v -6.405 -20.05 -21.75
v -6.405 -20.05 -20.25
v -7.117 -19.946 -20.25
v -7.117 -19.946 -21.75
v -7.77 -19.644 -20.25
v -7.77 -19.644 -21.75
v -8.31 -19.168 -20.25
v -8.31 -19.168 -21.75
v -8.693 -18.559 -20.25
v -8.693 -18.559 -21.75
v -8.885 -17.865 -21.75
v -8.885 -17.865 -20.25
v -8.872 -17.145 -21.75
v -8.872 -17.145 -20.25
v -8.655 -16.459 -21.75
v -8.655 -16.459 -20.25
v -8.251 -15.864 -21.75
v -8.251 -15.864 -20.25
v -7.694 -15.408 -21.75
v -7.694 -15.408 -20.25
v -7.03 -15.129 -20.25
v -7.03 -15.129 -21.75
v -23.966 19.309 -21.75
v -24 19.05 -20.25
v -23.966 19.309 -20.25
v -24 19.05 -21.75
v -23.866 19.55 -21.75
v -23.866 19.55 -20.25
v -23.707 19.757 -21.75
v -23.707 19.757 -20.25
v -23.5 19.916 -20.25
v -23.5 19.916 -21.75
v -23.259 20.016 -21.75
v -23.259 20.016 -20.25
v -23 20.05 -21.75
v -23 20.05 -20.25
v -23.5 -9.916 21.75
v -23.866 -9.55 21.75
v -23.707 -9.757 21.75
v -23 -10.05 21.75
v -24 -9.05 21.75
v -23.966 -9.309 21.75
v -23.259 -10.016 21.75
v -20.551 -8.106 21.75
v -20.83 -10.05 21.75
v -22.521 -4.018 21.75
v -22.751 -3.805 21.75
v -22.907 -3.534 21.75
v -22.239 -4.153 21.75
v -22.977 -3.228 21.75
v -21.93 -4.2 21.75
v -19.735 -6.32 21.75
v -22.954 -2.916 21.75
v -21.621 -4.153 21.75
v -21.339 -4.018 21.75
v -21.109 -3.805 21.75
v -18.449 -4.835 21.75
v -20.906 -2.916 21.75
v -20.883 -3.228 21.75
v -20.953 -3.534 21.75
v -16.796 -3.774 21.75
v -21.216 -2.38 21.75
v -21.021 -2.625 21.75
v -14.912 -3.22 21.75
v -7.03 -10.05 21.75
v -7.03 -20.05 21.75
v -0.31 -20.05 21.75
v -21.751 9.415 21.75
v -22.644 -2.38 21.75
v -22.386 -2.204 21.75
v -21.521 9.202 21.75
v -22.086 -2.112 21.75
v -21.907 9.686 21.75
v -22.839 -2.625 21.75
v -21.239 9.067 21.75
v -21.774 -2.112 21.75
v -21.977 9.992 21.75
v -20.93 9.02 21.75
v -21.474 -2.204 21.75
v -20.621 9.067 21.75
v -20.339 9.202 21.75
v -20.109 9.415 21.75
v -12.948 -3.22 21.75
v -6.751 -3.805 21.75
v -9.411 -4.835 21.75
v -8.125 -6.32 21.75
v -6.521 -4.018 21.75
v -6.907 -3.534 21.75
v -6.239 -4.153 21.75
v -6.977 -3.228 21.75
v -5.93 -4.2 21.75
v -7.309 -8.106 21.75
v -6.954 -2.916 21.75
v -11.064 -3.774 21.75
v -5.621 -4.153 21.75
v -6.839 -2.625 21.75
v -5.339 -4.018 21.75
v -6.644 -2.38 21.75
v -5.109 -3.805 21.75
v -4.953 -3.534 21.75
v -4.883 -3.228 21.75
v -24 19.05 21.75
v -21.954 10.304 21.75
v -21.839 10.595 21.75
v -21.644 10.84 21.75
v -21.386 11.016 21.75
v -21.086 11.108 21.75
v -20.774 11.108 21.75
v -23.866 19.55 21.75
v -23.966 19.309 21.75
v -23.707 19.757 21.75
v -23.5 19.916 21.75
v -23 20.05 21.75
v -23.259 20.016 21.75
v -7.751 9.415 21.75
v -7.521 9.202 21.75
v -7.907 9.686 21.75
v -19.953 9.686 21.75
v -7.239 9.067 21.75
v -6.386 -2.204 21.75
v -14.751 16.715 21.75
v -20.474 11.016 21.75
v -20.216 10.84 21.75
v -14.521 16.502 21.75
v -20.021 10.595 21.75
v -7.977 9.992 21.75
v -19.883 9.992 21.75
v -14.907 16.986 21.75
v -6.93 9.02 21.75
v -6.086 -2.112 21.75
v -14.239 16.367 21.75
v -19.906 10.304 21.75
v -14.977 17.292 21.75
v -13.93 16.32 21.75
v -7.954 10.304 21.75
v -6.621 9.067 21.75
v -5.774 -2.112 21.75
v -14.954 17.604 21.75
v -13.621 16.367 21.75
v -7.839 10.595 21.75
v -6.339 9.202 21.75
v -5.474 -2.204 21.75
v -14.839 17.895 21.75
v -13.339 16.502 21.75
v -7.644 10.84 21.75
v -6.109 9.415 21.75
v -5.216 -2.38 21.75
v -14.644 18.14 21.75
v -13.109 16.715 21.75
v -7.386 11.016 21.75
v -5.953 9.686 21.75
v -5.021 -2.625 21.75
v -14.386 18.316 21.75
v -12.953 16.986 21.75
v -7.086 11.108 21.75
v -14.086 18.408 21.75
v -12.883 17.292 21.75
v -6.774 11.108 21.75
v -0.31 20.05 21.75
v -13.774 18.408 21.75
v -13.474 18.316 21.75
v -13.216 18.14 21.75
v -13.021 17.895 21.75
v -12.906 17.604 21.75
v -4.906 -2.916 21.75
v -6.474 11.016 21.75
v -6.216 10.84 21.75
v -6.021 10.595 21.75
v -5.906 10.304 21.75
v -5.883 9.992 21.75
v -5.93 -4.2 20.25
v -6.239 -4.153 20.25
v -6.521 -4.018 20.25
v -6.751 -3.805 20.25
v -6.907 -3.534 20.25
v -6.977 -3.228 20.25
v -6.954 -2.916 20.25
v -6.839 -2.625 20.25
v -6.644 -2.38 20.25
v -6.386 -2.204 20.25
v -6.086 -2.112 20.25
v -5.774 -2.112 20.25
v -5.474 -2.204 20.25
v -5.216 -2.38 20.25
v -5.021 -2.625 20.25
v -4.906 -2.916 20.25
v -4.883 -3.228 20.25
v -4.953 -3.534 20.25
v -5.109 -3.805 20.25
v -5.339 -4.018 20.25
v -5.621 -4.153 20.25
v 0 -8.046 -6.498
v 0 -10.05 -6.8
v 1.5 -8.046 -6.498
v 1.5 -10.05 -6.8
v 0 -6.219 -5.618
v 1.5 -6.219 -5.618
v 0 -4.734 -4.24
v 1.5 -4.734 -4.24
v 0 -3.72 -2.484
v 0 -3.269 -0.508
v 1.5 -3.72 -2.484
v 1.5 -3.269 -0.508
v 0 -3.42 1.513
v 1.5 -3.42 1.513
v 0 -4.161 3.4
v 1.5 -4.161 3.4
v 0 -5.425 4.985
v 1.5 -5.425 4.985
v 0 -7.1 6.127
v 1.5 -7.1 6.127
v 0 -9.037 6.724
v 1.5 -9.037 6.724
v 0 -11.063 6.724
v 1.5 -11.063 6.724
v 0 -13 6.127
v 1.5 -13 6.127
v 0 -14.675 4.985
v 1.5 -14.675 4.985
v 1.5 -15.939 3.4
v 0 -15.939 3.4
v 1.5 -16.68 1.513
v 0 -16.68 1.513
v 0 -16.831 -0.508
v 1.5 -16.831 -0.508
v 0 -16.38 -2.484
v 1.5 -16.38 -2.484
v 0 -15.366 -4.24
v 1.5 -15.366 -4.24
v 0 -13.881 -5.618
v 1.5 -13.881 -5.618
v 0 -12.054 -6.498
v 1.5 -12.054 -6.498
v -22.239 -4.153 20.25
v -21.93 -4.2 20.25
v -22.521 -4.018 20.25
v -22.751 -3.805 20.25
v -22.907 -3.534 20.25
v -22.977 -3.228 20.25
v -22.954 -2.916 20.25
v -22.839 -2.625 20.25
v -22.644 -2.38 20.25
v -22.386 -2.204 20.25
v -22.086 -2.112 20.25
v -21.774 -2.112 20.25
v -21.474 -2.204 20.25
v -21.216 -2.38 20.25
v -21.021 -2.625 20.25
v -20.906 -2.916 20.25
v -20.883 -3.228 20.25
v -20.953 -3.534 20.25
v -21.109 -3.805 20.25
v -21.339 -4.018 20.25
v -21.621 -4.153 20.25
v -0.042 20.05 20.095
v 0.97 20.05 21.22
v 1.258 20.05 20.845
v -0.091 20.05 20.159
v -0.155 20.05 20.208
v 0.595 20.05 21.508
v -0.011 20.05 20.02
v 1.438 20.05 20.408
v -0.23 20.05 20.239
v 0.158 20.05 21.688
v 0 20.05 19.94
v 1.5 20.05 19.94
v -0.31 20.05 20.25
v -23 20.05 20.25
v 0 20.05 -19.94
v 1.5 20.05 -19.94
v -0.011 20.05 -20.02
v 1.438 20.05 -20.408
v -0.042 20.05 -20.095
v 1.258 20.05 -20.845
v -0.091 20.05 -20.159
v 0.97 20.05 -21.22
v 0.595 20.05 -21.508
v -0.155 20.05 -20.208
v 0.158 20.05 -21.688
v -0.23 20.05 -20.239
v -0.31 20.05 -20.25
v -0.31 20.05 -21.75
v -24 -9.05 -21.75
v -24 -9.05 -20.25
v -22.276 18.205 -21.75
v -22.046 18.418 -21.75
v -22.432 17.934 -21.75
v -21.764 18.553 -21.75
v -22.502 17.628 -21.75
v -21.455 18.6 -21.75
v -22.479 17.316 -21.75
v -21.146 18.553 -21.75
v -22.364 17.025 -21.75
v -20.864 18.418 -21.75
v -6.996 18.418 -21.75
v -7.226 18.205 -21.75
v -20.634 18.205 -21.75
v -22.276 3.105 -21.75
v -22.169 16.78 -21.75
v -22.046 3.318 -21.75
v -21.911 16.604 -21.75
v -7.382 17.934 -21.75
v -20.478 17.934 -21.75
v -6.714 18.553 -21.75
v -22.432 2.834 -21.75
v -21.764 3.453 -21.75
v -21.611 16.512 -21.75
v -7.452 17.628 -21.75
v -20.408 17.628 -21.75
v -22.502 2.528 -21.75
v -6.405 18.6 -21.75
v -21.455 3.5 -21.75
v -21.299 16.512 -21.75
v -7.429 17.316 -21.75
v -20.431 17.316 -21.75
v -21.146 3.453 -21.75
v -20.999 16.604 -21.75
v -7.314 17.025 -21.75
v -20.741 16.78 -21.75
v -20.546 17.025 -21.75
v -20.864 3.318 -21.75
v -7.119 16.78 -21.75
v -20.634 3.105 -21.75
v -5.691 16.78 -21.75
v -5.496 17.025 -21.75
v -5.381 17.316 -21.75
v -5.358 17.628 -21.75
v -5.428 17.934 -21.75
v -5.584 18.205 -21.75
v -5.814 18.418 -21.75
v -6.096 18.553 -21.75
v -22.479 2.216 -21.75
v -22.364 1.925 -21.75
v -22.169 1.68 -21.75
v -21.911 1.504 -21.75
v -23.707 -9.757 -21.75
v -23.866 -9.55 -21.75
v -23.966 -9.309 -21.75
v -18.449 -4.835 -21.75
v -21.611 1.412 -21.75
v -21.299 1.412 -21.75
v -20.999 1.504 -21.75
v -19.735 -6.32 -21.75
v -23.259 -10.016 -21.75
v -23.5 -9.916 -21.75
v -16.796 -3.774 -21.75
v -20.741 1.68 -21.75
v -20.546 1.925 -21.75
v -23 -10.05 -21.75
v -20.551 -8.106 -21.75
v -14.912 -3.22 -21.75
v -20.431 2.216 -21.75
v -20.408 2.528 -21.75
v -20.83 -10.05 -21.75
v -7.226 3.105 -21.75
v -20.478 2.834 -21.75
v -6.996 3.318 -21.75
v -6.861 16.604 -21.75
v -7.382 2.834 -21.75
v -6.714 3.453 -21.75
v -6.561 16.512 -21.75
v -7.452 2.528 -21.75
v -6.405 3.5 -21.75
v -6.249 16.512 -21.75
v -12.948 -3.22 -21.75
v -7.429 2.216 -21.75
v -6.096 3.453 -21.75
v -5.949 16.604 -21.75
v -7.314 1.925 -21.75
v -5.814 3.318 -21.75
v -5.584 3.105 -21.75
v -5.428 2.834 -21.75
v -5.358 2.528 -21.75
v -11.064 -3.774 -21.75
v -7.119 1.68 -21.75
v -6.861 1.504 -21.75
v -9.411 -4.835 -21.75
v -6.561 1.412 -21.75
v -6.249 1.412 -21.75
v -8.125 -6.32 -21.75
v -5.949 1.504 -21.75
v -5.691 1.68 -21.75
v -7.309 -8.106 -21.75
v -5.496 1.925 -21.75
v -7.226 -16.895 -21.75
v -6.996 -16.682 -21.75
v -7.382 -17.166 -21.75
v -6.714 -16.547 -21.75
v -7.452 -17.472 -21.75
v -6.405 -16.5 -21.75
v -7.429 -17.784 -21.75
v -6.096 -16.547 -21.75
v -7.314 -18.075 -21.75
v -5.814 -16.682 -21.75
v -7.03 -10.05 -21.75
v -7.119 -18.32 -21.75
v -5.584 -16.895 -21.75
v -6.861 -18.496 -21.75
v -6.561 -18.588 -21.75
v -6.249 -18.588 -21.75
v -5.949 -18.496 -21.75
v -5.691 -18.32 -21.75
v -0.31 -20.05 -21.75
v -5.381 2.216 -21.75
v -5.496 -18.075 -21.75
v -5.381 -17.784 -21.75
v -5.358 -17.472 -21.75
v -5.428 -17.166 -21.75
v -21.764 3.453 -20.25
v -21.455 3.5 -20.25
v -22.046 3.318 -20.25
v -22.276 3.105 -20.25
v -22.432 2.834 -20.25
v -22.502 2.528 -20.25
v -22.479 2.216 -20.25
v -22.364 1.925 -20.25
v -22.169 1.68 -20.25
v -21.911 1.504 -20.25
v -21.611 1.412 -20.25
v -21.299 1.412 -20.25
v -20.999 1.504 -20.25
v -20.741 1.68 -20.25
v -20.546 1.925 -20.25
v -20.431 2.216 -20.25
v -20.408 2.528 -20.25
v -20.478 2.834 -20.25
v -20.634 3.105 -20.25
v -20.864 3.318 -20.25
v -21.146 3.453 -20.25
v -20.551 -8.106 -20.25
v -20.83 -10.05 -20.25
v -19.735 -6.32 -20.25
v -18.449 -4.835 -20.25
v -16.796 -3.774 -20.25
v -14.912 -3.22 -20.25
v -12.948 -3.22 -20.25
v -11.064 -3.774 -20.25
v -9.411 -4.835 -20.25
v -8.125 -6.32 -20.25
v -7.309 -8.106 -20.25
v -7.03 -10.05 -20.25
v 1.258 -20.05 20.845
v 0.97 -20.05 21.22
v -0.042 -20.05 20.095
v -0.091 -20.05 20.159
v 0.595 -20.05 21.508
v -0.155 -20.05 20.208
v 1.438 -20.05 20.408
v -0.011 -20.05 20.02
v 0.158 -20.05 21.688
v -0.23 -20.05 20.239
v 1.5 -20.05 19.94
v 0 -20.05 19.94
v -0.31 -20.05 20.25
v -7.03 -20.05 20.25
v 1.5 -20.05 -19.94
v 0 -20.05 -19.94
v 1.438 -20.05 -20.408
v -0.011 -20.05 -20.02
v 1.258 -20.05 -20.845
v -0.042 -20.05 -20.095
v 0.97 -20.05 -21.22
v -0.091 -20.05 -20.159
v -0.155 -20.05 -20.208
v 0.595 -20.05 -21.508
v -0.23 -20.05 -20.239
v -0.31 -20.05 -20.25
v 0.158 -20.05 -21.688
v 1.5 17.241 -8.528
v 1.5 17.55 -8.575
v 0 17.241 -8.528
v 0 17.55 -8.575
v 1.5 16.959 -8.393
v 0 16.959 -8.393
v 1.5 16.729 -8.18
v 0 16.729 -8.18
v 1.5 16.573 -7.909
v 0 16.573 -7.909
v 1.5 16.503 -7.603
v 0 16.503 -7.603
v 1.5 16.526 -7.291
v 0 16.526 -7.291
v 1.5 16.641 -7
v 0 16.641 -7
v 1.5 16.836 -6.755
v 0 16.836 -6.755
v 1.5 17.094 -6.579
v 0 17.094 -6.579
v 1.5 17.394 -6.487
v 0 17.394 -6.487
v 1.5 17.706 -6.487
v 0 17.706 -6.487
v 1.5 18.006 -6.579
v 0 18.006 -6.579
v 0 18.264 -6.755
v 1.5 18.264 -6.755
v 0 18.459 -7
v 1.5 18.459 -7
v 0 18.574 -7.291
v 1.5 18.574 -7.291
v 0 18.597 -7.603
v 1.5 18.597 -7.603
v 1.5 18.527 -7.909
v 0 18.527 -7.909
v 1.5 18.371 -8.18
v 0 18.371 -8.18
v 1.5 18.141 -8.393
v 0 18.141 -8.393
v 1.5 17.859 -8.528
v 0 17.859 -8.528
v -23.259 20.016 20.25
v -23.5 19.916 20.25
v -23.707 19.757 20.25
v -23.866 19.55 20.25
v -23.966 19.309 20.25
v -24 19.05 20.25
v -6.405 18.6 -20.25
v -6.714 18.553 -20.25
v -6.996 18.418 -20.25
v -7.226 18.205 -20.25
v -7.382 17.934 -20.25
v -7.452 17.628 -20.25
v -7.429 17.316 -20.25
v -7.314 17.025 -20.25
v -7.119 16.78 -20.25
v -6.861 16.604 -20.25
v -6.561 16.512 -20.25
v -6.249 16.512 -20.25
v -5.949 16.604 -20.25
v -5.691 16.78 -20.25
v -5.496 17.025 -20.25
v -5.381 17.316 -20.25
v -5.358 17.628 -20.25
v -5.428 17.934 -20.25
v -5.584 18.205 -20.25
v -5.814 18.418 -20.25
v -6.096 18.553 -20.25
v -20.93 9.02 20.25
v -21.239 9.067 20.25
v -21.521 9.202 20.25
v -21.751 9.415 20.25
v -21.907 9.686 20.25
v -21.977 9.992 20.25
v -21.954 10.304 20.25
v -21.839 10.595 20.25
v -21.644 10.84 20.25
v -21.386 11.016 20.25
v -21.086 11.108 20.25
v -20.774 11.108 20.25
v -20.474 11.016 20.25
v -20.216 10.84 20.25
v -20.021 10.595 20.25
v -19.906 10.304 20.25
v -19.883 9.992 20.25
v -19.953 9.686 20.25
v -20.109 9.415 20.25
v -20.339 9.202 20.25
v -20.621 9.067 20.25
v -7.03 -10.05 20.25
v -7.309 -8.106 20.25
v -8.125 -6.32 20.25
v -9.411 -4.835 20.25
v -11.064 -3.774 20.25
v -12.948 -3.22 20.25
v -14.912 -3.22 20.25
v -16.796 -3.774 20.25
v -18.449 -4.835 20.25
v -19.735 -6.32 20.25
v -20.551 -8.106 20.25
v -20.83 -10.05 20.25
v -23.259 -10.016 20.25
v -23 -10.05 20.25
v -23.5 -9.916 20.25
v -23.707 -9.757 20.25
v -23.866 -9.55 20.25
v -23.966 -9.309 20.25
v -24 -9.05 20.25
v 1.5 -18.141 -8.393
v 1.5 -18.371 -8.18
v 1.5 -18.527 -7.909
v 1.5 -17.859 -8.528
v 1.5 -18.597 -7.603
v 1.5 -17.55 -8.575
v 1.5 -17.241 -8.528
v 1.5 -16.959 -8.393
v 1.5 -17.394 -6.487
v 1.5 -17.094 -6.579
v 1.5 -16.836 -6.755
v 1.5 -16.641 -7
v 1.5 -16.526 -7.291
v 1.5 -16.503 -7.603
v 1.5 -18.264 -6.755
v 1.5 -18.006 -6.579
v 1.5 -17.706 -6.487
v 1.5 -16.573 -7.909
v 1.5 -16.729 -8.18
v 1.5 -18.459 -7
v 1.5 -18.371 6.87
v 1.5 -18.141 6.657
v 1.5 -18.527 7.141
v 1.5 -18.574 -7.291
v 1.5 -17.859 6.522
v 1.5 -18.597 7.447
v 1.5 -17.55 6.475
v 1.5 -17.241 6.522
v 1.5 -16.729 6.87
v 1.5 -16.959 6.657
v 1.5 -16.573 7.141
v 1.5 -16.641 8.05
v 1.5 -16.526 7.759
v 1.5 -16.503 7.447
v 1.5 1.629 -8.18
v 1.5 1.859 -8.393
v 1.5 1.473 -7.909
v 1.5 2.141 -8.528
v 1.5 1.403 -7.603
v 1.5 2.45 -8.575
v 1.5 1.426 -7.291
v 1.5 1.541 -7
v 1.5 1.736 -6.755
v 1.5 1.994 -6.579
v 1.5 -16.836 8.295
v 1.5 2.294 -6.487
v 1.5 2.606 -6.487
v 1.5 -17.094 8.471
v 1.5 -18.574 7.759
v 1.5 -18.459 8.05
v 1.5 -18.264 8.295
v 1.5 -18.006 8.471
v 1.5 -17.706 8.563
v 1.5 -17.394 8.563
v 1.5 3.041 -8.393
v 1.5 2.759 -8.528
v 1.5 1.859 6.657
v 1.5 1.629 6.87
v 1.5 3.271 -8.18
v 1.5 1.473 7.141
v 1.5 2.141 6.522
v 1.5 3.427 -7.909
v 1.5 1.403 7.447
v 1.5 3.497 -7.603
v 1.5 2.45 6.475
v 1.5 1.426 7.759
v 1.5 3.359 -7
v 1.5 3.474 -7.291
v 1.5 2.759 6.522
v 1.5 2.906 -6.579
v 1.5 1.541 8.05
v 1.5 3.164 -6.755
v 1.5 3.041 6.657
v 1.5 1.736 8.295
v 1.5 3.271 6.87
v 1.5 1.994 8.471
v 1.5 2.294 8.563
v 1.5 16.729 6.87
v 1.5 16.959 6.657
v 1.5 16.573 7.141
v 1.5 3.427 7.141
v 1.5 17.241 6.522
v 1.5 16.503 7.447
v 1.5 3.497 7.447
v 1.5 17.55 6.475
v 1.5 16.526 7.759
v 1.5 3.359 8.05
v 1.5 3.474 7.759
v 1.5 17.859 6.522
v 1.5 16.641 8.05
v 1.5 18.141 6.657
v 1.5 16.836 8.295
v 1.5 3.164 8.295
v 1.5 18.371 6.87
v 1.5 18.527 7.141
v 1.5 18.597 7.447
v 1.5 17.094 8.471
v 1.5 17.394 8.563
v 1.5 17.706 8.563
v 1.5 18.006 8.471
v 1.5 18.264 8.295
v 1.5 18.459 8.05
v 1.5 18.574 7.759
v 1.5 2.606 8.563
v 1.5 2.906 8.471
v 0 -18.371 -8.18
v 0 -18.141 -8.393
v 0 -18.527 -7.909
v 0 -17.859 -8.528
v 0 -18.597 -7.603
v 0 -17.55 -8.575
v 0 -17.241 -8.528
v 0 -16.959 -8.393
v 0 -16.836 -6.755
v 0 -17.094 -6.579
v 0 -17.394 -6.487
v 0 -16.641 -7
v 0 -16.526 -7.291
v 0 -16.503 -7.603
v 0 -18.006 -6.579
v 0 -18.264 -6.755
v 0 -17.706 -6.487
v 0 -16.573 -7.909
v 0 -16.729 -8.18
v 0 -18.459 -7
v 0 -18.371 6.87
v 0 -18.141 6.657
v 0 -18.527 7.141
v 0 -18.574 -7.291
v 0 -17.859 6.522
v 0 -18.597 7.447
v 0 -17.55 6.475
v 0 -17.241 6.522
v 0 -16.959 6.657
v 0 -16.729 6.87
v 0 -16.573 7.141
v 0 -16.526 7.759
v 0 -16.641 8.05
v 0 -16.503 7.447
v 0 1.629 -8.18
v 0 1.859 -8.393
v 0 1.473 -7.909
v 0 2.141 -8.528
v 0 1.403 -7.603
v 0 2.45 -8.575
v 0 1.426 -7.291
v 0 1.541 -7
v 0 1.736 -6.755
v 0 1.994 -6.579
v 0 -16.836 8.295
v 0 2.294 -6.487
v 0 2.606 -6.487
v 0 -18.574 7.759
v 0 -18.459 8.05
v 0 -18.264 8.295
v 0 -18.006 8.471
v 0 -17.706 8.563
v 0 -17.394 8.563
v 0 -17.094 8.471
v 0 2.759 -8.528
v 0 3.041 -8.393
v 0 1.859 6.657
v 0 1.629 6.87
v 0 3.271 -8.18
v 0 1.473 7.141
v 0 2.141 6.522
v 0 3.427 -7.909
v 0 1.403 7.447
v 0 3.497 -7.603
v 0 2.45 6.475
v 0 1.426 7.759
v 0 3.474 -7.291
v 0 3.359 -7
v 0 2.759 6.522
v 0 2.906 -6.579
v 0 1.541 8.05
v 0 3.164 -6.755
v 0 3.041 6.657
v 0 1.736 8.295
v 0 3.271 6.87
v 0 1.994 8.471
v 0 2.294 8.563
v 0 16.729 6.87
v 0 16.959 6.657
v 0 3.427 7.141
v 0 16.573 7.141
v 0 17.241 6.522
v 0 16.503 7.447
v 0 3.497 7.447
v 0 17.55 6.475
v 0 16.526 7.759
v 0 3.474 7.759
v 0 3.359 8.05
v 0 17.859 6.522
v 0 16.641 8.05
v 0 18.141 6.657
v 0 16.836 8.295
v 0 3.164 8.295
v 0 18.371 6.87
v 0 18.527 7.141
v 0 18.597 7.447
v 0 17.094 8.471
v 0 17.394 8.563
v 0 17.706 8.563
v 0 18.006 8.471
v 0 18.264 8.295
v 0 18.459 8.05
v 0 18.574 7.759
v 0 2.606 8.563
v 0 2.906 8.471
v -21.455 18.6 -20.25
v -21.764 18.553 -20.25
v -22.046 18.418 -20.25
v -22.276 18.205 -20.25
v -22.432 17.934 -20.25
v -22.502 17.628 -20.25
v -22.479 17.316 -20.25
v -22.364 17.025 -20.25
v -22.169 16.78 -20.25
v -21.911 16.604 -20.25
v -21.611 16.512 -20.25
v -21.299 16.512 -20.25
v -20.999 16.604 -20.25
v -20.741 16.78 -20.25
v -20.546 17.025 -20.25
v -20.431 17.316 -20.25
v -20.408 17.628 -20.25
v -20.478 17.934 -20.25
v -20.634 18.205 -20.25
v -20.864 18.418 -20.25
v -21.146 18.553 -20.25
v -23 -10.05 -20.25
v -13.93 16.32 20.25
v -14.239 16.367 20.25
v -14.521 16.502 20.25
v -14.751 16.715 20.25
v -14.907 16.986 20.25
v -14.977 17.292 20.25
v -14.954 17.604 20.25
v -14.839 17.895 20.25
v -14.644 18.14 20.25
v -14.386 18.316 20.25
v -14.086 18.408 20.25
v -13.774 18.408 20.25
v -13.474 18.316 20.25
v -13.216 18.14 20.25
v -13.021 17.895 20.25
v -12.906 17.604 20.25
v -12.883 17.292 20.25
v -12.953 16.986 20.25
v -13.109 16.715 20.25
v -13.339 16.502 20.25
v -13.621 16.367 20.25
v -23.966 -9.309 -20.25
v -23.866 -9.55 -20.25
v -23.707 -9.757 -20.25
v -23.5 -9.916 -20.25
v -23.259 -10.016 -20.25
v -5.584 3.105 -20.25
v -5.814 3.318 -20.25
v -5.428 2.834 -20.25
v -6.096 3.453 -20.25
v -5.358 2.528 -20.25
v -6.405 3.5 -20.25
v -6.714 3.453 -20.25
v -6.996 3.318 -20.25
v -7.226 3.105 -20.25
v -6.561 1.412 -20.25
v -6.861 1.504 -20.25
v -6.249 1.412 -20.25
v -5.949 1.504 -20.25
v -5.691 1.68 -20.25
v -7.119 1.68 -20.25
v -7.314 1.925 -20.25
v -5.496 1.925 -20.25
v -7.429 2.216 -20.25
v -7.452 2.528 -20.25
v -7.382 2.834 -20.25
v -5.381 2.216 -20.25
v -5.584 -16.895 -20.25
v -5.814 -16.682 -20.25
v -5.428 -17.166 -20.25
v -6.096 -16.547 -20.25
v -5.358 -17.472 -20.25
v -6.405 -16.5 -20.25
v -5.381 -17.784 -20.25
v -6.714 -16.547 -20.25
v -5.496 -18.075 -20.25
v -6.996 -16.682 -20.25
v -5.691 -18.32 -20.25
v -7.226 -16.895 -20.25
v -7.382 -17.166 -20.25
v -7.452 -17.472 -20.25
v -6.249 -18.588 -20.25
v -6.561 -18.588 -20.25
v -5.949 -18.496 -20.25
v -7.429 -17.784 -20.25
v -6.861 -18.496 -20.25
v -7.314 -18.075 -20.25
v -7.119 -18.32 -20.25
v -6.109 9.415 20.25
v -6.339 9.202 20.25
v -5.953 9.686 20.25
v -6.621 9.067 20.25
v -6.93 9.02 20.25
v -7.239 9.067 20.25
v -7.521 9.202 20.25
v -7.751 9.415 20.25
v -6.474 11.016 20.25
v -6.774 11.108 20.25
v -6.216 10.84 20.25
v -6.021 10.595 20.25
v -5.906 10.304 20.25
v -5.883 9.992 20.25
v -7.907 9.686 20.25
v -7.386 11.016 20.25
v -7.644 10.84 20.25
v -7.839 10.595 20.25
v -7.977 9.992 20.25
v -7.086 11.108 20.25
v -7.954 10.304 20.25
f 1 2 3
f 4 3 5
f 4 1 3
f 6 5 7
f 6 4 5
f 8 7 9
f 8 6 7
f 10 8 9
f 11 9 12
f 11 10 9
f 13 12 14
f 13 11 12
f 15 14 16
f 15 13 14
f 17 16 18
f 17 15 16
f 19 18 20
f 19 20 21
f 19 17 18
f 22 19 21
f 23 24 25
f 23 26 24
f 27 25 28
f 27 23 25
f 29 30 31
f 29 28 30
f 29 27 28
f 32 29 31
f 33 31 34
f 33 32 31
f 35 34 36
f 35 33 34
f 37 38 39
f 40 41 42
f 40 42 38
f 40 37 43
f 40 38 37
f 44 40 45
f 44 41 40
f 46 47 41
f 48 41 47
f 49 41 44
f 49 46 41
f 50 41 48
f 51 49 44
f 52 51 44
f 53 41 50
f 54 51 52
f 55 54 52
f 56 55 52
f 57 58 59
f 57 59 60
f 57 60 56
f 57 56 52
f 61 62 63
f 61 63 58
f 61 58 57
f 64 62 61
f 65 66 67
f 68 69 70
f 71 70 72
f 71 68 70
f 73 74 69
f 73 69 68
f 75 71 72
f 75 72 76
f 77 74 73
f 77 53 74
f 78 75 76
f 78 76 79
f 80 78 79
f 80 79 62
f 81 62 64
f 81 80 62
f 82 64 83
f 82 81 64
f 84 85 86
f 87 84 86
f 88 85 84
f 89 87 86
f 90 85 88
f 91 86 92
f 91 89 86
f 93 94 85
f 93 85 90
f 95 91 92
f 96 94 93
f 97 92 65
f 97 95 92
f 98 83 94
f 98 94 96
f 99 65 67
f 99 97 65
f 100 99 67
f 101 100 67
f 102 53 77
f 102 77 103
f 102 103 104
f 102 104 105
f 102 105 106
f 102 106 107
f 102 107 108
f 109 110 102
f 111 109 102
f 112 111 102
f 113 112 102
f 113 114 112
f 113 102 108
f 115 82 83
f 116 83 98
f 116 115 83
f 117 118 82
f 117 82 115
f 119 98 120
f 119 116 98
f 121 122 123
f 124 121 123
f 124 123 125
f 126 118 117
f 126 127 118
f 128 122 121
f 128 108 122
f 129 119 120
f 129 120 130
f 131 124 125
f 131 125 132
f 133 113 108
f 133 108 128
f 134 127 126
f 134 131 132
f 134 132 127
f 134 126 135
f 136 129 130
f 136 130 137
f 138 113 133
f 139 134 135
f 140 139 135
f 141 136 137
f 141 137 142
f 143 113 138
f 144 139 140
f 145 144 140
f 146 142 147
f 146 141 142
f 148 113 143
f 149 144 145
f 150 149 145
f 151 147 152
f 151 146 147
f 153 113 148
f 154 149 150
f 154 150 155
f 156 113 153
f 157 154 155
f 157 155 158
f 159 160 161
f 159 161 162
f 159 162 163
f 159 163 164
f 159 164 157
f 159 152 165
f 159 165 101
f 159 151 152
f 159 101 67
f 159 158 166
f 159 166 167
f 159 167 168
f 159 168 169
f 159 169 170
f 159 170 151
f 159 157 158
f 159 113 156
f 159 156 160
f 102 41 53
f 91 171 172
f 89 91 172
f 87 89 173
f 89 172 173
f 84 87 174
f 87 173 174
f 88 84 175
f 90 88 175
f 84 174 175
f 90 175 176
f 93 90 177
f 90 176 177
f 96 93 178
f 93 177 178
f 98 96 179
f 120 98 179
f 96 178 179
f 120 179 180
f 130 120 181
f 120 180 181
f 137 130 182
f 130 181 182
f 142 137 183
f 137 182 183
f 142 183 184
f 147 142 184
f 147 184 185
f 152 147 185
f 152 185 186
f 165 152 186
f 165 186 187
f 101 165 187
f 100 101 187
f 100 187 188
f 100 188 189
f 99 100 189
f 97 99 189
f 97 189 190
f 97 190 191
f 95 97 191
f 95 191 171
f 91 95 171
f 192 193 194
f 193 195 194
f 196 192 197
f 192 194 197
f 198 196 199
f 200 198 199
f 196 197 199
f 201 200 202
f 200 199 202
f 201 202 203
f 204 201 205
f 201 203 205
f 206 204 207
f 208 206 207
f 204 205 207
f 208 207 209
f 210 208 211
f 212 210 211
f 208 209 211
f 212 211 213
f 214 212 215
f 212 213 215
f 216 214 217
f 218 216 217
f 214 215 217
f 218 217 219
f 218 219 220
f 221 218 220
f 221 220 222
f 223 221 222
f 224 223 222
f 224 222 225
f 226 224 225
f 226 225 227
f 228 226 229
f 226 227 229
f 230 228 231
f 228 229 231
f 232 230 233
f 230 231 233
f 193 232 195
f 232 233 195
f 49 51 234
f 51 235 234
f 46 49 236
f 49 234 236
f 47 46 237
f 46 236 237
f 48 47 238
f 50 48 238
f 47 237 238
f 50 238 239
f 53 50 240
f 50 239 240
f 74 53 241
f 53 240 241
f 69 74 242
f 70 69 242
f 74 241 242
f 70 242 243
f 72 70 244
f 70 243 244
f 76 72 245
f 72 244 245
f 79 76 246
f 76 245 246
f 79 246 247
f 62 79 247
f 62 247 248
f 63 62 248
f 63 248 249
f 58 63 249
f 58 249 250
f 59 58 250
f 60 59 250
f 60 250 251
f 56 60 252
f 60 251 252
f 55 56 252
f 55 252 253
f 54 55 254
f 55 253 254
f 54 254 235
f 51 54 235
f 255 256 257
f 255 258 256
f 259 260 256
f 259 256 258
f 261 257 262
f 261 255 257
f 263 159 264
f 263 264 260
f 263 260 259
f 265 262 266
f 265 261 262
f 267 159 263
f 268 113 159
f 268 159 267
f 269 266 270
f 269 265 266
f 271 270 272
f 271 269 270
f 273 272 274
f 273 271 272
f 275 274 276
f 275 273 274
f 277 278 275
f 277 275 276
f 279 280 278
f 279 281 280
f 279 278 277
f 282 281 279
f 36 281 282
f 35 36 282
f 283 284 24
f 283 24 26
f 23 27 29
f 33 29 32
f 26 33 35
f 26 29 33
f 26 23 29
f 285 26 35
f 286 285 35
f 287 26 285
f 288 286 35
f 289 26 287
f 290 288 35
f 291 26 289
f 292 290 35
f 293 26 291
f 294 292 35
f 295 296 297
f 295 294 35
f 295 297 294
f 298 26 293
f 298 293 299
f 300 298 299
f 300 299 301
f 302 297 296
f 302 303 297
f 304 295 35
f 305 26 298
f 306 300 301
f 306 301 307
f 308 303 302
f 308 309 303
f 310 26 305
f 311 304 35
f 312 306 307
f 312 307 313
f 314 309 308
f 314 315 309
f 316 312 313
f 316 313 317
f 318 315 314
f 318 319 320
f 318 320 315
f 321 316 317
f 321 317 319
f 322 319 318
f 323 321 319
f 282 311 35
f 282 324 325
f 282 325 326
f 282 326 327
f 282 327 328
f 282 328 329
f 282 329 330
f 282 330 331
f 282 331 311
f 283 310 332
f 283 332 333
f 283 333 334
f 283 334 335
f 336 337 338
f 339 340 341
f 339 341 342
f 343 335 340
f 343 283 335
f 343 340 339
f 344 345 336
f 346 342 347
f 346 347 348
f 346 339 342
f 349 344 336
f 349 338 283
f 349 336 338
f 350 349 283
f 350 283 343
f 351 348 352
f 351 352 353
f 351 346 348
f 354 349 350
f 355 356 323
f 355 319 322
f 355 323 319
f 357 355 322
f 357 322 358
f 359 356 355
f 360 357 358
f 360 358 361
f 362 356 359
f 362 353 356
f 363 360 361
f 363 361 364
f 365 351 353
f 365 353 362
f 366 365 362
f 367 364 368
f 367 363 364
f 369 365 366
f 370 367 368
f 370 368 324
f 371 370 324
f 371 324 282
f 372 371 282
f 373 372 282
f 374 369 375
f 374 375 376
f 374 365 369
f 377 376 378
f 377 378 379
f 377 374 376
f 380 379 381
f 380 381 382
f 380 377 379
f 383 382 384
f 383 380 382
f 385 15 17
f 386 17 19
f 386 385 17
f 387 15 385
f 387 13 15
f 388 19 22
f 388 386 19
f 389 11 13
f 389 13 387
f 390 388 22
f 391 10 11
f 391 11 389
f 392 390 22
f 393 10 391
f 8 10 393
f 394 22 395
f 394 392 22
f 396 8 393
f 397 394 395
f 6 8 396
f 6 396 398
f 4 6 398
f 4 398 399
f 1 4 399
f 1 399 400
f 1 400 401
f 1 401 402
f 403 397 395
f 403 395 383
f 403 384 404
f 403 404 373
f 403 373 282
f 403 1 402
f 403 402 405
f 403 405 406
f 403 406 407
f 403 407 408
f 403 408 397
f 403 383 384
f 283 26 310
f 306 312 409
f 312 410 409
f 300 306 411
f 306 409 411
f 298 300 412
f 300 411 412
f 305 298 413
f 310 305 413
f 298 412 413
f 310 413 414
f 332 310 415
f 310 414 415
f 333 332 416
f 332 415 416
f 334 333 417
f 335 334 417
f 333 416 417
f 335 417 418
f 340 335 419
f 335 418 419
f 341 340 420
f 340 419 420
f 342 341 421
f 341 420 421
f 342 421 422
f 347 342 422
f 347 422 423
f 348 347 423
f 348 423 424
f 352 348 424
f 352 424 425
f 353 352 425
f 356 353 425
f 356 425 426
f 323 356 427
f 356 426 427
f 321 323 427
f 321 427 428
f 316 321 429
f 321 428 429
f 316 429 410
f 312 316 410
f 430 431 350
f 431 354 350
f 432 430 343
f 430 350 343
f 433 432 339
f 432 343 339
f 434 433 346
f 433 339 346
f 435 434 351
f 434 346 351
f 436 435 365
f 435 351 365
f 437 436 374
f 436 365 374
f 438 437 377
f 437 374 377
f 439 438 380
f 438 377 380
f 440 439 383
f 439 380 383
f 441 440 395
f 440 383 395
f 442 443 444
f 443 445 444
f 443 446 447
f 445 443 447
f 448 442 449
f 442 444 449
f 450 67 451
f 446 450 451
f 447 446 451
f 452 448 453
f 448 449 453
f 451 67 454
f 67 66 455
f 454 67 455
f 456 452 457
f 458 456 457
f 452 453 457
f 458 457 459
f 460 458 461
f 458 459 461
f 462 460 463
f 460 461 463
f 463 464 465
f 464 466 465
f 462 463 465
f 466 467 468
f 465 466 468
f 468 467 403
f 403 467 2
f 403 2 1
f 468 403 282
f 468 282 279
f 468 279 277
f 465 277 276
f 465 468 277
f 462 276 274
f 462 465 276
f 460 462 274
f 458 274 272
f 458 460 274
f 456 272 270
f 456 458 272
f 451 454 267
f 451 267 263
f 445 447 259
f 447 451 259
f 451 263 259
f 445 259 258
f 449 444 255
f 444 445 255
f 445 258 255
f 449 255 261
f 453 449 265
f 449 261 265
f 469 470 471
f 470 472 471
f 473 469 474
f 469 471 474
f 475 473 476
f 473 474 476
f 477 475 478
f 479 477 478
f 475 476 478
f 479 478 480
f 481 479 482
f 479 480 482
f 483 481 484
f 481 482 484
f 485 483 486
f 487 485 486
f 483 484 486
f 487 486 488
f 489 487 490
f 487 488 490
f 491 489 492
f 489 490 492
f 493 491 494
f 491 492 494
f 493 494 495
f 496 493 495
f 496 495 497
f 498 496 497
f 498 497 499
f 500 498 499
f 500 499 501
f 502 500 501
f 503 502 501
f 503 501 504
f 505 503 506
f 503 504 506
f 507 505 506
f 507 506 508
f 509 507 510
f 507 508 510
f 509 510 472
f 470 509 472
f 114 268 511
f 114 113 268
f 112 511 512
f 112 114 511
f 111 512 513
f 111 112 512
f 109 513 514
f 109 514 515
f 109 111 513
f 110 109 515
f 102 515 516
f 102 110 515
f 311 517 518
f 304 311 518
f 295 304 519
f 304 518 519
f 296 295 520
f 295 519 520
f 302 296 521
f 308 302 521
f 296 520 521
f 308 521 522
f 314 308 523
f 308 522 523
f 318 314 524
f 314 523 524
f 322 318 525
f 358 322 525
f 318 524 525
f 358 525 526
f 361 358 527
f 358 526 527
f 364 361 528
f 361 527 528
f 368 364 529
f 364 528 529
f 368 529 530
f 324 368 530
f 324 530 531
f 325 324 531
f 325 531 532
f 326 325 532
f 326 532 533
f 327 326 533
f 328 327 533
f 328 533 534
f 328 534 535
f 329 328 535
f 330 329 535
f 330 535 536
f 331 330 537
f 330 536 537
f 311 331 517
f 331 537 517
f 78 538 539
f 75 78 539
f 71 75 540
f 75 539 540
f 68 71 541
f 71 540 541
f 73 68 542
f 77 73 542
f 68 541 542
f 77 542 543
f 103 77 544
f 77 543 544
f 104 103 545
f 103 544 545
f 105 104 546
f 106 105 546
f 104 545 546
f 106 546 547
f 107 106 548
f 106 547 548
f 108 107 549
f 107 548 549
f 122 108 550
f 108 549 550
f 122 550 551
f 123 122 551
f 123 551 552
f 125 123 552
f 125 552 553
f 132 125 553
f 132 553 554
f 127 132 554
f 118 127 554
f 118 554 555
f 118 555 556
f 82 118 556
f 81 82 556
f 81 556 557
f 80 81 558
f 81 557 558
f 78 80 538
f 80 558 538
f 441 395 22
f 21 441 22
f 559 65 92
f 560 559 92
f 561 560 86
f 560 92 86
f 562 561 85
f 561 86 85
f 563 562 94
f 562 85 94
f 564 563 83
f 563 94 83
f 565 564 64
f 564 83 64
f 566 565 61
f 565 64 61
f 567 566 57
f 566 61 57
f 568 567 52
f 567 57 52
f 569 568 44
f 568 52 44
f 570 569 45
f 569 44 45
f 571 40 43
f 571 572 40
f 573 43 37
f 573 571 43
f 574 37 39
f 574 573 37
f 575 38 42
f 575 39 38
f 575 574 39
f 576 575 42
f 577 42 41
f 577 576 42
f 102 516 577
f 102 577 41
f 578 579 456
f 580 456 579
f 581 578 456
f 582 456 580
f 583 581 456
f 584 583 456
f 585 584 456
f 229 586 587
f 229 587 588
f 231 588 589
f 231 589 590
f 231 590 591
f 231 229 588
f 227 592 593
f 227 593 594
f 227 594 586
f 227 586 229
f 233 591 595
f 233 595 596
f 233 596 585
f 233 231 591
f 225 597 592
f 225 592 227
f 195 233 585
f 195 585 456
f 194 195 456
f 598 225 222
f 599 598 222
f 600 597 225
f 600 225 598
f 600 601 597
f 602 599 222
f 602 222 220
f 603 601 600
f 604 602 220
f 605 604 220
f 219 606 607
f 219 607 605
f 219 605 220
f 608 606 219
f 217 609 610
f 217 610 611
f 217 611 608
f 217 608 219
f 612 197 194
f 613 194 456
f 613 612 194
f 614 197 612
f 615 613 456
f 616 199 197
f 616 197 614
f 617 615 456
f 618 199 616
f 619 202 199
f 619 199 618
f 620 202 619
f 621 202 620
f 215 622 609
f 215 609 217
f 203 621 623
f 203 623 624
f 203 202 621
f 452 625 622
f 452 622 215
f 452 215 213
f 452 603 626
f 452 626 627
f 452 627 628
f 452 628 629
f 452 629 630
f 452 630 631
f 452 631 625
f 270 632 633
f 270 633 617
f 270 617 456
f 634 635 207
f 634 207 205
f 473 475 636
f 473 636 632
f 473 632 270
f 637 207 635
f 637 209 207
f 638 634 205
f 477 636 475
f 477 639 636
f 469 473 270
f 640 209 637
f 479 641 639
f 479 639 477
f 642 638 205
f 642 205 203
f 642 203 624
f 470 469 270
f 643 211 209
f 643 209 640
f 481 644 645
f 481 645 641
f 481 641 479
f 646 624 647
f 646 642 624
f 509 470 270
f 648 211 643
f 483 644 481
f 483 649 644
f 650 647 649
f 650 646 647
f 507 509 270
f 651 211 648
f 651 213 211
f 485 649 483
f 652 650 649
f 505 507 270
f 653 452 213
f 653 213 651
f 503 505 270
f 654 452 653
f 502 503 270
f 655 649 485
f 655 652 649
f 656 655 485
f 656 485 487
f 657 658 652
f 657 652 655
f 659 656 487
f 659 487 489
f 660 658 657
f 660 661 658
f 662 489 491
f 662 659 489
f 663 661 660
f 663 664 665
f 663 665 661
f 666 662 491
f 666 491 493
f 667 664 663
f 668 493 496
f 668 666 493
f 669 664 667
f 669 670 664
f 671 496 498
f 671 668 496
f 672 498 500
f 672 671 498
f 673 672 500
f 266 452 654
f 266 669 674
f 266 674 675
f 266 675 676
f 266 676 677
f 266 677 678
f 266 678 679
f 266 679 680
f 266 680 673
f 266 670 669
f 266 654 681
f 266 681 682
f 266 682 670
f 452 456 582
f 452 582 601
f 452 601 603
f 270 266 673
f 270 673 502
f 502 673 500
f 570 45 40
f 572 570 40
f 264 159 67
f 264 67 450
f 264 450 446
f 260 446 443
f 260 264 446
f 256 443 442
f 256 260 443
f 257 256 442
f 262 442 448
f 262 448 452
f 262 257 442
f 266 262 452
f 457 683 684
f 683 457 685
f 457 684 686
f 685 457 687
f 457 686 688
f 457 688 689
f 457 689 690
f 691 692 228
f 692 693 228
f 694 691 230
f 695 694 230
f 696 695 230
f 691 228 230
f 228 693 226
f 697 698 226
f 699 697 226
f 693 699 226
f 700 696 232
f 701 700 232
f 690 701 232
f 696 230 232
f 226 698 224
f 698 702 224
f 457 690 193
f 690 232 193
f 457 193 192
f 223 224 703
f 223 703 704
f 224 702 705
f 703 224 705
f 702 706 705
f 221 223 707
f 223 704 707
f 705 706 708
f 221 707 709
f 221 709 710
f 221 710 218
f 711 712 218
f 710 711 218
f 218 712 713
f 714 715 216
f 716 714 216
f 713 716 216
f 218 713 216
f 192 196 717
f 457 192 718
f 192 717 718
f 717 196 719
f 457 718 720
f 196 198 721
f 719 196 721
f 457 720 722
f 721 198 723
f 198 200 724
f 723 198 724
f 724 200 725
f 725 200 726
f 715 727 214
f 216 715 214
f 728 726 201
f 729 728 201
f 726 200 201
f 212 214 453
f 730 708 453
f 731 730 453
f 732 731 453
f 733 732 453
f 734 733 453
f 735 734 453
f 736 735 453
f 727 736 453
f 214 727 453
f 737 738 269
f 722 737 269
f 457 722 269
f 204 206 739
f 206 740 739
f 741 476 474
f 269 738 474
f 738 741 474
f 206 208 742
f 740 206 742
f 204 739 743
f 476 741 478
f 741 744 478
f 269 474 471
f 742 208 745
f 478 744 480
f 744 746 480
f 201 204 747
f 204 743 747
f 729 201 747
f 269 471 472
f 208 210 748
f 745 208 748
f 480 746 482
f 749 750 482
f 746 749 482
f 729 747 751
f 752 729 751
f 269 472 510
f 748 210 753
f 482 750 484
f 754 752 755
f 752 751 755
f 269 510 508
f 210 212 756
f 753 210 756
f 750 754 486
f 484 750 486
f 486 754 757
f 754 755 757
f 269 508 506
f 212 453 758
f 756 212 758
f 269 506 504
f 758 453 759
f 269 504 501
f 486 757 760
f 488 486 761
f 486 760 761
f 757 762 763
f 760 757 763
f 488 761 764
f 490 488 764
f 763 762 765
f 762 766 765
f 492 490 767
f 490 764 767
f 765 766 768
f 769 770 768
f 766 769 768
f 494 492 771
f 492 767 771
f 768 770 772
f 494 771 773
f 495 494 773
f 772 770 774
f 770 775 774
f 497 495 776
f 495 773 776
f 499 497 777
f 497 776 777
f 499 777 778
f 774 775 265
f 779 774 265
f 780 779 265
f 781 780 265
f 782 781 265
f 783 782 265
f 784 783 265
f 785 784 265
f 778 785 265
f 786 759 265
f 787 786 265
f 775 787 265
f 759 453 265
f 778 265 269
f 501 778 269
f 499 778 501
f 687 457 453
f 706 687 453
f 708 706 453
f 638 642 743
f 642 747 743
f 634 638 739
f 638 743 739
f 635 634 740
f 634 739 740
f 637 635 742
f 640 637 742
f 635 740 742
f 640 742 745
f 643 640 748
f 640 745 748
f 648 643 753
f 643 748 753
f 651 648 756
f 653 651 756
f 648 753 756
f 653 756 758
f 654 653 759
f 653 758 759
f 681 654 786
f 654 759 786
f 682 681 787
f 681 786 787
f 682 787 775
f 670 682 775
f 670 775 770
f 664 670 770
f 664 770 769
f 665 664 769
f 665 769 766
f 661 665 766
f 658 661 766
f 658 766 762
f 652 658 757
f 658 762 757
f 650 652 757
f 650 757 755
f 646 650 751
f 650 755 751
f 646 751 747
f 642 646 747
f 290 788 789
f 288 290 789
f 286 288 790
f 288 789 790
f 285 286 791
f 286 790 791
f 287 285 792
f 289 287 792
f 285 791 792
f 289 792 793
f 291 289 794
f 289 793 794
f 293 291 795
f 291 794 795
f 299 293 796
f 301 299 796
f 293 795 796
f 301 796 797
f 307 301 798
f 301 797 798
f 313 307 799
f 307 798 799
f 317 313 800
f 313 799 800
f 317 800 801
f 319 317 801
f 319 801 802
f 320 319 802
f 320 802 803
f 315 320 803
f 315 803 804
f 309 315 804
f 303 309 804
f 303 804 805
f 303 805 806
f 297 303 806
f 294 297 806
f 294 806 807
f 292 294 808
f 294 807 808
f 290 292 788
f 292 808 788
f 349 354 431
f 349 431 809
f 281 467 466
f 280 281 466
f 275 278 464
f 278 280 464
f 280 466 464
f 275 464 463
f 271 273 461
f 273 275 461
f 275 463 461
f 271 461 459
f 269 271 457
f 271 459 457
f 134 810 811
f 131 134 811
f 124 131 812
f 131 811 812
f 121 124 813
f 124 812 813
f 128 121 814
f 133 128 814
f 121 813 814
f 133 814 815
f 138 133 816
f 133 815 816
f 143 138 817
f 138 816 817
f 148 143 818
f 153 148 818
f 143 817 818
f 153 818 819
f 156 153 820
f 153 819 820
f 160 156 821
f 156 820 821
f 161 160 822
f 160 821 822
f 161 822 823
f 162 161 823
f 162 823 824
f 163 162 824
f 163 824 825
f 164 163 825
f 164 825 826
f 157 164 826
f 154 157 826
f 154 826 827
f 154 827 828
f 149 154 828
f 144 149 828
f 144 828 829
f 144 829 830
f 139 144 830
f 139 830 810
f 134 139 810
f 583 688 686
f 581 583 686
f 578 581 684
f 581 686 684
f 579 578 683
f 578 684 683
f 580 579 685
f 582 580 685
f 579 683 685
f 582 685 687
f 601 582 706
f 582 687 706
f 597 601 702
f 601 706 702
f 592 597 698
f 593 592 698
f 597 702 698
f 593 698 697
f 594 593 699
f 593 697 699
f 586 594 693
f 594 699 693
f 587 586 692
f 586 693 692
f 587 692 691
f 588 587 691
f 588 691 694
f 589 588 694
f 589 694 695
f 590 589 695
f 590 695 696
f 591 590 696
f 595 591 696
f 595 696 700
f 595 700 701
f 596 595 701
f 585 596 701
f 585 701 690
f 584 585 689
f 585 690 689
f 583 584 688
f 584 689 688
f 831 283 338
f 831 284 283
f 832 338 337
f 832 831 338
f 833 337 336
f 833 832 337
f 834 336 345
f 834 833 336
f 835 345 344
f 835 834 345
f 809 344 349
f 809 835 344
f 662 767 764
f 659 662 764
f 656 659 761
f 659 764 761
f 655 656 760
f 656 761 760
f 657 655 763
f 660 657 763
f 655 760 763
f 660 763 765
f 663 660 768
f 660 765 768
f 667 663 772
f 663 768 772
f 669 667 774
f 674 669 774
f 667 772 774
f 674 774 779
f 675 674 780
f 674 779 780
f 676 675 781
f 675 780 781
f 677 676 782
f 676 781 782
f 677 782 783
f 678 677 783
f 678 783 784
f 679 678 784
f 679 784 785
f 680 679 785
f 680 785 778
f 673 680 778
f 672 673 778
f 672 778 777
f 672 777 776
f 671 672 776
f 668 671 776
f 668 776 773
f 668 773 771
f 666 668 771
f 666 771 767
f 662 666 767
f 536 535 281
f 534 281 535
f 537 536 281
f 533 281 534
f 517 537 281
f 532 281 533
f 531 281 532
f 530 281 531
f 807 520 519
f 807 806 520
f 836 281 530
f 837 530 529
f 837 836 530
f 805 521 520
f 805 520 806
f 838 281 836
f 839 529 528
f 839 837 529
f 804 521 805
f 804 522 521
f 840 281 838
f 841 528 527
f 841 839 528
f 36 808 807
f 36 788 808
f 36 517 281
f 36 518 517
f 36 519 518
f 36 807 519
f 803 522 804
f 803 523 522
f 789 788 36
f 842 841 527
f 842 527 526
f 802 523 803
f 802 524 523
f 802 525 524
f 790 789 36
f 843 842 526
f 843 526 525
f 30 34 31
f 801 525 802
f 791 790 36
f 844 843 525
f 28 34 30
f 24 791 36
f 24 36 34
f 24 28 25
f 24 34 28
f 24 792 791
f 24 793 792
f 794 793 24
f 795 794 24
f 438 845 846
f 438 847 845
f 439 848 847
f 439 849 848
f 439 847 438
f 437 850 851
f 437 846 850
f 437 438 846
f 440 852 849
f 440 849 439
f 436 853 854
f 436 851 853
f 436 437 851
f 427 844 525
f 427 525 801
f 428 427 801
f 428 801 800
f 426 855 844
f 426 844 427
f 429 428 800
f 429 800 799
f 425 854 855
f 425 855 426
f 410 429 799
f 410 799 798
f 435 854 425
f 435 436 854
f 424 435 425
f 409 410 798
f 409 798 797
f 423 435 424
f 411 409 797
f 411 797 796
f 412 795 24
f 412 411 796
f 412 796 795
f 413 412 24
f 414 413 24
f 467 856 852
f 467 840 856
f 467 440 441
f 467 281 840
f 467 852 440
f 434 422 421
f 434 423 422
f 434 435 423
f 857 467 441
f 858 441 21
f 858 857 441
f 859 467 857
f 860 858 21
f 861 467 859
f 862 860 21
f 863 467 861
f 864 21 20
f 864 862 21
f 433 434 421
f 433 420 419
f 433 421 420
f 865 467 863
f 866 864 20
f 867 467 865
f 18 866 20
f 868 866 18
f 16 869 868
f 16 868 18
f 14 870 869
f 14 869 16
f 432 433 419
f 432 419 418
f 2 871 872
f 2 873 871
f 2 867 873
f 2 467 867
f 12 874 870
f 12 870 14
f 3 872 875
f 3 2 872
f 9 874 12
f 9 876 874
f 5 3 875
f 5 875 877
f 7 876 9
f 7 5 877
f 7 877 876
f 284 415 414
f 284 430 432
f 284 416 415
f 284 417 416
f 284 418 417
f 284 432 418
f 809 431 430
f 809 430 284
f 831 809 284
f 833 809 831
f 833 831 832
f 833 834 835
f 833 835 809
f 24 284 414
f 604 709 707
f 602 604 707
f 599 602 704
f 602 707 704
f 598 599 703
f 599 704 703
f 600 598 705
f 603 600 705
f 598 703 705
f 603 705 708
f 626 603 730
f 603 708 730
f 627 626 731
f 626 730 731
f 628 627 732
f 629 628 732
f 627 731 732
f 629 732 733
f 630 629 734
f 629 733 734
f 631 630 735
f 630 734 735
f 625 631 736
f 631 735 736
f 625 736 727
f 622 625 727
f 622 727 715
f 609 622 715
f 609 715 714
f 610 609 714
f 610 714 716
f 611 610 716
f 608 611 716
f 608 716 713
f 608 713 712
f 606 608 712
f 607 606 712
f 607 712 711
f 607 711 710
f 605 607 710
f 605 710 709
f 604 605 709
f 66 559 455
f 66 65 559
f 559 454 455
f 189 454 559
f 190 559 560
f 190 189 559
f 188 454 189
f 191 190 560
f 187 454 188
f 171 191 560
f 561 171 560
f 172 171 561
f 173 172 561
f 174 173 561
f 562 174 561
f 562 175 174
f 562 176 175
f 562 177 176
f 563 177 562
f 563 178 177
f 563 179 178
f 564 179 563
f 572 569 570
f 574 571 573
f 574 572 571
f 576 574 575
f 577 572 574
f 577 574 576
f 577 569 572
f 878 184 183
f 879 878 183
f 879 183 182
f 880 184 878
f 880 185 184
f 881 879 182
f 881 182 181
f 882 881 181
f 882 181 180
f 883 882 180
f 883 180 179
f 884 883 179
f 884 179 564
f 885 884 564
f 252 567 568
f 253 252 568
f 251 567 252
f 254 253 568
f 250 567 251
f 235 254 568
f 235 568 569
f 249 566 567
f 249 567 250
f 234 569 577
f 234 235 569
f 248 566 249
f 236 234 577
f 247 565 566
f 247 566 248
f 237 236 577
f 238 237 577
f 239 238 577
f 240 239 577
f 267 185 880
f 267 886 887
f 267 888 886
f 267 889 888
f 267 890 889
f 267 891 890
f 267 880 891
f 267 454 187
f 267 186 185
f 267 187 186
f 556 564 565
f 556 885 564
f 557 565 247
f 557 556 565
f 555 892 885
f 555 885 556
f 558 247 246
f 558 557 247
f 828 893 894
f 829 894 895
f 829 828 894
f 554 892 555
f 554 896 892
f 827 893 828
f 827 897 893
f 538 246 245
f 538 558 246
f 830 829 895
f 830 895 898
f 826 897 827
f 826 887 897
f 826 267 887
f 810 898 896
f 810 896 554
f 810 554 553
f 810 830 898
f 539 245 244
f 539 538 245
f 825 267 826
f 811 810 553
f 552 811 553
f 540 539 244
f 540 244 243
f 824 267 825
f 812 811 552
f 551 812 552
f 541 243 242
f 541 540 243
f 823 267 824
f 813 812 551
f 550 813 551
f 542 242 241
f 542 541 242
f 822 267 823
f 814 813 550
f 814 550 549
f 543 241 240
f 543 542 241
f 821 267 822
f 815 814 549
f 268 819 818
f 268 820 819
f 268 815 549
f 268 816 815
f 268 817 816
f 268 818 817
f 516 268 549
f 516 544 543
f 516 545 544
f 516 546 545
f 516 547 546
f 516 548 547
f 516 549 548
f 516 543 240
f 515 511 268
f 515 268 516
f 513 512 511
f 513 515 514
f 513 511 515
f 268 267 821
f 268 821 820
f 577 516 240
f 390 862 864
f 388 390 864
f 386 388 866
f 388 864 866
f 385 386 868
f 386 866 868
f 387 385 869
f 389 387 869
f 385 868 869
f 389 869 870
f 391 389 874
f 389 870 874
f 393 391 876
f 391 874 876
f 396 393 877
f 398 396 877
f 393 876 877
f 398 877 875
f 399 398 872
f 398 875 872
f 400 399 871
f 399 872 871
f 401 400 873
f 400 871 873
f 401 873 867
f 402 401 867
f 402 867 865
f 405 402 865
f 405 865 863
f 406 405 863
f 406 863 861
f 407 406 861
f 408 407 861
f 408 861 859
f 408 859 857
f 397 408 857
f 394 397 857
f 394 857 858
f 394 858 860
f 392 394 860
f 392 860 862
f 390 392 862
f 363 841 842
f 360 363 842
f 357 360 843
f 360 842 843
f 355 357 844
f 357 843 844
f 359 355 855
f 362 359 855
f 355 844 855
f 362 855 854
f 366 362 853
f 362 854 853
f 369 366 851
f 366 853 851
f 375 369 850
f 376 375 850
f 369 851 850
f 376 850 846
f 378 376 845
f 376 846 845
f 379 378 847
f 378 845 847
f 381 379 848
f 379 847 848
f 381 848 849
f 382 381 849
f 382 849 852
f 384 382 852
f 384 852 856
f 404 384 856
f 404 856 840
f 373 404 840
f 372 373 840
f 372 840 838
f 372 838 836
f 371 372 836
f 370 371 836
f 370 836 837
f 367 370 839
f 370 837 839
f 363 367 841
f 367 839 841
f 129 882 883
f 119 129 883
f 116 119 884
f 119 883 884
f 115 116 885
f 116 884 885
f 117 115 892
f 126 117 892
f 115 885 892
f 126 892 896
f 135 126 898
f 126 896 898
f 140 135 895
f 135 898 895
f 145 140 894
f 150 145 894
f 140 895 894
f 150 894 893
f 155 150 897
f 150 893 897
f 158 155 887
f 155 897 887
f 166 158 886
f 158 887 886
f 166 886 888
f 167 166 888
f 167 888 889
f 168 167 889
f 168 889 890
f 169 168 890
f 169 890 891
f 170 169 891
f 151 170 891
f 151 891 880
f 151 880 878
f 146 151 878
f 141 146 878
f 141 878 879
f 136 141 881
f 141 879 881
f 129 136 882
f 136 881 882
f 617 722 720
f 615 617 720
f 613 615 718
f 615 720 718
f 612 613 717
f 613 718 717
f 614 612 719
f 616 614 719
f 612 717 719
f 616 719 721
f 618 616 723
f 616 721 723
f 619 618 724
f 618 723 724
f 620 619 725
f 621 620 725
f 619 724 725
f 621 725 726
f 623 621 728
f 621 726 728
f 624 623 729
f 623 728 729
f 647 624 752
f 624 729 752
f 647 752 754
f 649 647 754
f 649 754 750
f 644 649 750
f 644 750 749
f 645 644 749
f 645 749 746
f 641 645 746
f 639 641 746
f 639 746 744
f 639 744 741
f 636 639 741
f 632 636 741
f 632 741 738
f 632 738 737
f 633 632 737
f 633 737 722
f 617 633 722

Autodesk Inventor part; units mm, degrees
ref_plane "YZ Plane" through (0, 0, 0) normal (1, 0, 0) x (0, 1, 0)
ref_plane "XZ Plane" through (0, 0, 0) normal (0, 1, 0) x (-1, 0, 0)
sketch "Sketch1" plane through (0, 0, 0) normal (1, 0, 0) x (0, 1, 0)
  line L0 (20.05, 20.25) -> (-20.05, 20.25)
  line L1 (-20.05, 20.25) -> (-20.05, -20.25)
  line L2 (-20.05, -20.25) -> (20.05, -20.25)
  line L3 (20.05, -20.25) -> (20.05, 20.25)
  line L4 (20.05, 20.25) -> (-20.05, -20.25) construction
  line L5 (-20.05, 20.25) -> (20.05, -20.25) construction
  point P0 (0, 0)
  dimension "d0" = 40.1
  dimension "d1" = 40.5
extrude "Plate1" add sketch "Sketch1" along normal blind 1.5
sketch "Sketch2" plane through (0, 20.05, 20.25) normal (0, 0, 1) x (1, 0, 0)
  line L0 (0, -40.1) -> (0, 0)
  line L1 (0, 0) -> (-24, 0)
  line L2 (-24, 0) -> (-24, -40.1)
  line L3 (-24, -40.1) -> (0, -40.1)
edge flange "Flange1" height 25.5 angle 90 thickness 1.5 bend radius 0.31 thickness toward (0, 0, 1) relief tear relief width 1.5 relief depth 0.75 corner gap 0.31 corner form 0 edges at (0, 0, 20.25) (0, 0, -20.25) wall of the first edge with corners at (0, -20.05, 20.25) (0, 20.05, 20.25) (-24, 20.05, 20.25) (-24, -20.05, 20.25)
bend "Bend1"
corner "Corner1"
sketch "Sketch3" plane through (-24, -20.05, 21.75) normal (0, 0, 1) x (1, 0, 0)
  circle A0 centre (10.07, 10) radius 6.4 projected
  line L0 (0, 0) -> (0, 40.1) projected
  line L1 (23.69, 0) -> (0, 0) projected
  line L2 (23.69, 0) -> (23.69, 40.1) projected
  circle A1 centre (10.07, 10) radius 6.9
  line L3 (3.17, 10) -> (0, 10)
  line L4 (16.97, 10) -> (16.97, 0)
  point P0 (24, 20.05)
  point P1 (10.07, 3.1)
  point P2 (10.07, 0)
  dimension "d13" = 0.5
sketch "Sketch4" plane through (-24, -20.05, -21.75) normal (0, 0, -1) x (-1, 0, 0)
  line L0 (-3.17, 10) -> (0, 10) projected
  line L1 (0, 0) -> (0, 40.1) projected
  circle A0 centre (-10.07, 10) radius 6.9 projected
  line L2 (-16.97, 10) -> (-16.97, 0) projected
  line L3 (-23.69, 0) -> (0, 0) projected
  arc A1 (-17.595, 0) -> (-16.97, 4.9206) centre (-17.595, 2.5) ccw
  point P0 (-24, 20.05)
  dimension "d53" = 5
  dimension "d54" = 2.5
  dimension "d55" = 0.625
extrude "Cut1" cut sketch "Sketch3" against normal blind 1.5 contours A0 | L0 L3 A1 L4 L1 | A1
extrude "Cut2" cut sketch "Sketch4" against normal blind 1.5 contours A0 | L0 L1 L3 L2 A1 A0 | L3 A1 L2
ref_plane "Work Plane1" through (-24, 20.05, 0) normal (0, 0, 1) x (1, 0, 0)
sketch "Sketch5" plane through (-24, 20.05, 21.75) normal (0, 0, 1) x (1, 0, 0)
  circle A0 centre (18.07, -23.2) radius 0.7835 projected
  circle A1 centre (2.07, -23.2) radius 0.7835 projected
  circle A2 centre (3.07, -9.98) radius 0.7835 projected
  circle A3 centre (17.07, -9.98) radius 0.7835 projected
  circle A4 centre (10.07, -2.68) radius 0.7835 projected
  point P0 (24, -20.05)
hole "Hole1" at (-13.93, 17.37, 21.75) at (-20.93, 10.07, 21.75) at (-6.93, 10.07, 21.75) at (-21.93, -3.15, 21.75) at (-5.93, -3.15, 21.75) direction (0, 0, -1) diameter 2.1 depth 1.5
sketch "Sketch6" plane through (-0.31, 20.05, -21.75) normal (0, 0, -1) x (-1, 0, 0)
  circle A0 centre (6.095, -17.6) radius 0.7835 projected
  circle A1 centre (6.095, -2.5) radius 0.7835 projected
  circle A2 centre (21.145, -2.5) radius 0.7835 projected
  circle A3 centre (21.145, -17.6) radius 0.7835 projected
  circle A4 centre (6.095, -37.6) radius 0.7835 projected
  point P0 (-0.31, -20.05)
fillet "Corner Round1" radius 1 4 edges at (-24, 20.05, -21) (-24, -10.05, -21) (-24, 20.05, 21) (-24, -10.05, 21)
hole "Hole3" at (-6.405, 17.55, -21.75) at (-21.455, 17.55, -21.75) at (-6.405, 2.45, -21.75) at (-21.455, 2.45, -21.75) at (-6.405, -17.55, -21.75) direction (0, 0, 1) diameter 2.1 depth 1.5
sketch "Sketch9" plane through (1.5, 0, 0) normal (1, 0, 0) x (0, 0, -1)
  circle A0 centre (7.525, 17.55) radius 0.7835
  circle A1 centre (-7.525, 17.55) radius 0.7835
  circle A2 centre (-7.525, 2.45) radius 0.7835
  circle A3 centre (7.525, 2.45) radius 0.7835
  circle A4 centre (7.525, -17.55) radius 0.7835
  circle A5 centre (-7.525, -17.55) radius 0.7835
  point P0 (0, 0)
hole "Hole4" at (1.5, 17.55, 7.525) at (1.5, 17.55, -7.525) at (1.5, 2.45, 7.525) at (1.5, 2.45, -7.525) at (1.5, -17.55, 7.525) at (1.5, -17.55, -7.525) direction (-1, 0, 0) diameter 2.1 end through all
sketch "Sketch10" plane through (1.5, 0, 0) normal (1, 0, 0) x (0, 0, -1)
  circle A0 centre (0, -10.05) radius 6.4
  circle A1 centre (0, -10.05) radius 6.8
  point P0 (0, 0)
  dimension "d50" = 0.4
extrude "Extrusion1" cut sketch "Sketch10" against normal through all contours A0 | A1
equation "\"d14\" = Thickness"
equation "\"d16\" = Thickness"
equation "\"d23\" = Thickness"
equation "\"d41\" = Thickness"
equation "\"d48\" = Thickness"
equation "\"d2\" = Thickness"
equation "\"d3\" = BendReliefWidth"
equation "\"d4\" = BendReliefDepth"
equation "\"d5\" = MinimumRemnant"
equation "\"d6\" = TransitionRadius"
equation "\"d9\" = BendRadius"
equation "\"d10\" = CornerReliefSize"
equation "\"d11\" = GapSize"
equation "\"d12\" = JacobiRadiusSize"
equation "\"BendReliefWidth\" = Thickness"
equation "\"BendReliefDepth\" = 0.5 * Thickness"
equation "\"CornerReliefSize\" = 4 * Thickness"
equation "\"MinimumRemnant\" = 2 * Thickness"
equation "\"TransitionRadius\" = BendRadius"
equation "\"JacobiRadiusSize\" = BendRadius"
equation "\"GapSize\" = Thickness"
equation "\"Thickness\" = 1.5"
equation "\"BendRadius\" = 0.31"
properties part number "axis_3_top_frame" material "Aluminum 6061-AHC"
